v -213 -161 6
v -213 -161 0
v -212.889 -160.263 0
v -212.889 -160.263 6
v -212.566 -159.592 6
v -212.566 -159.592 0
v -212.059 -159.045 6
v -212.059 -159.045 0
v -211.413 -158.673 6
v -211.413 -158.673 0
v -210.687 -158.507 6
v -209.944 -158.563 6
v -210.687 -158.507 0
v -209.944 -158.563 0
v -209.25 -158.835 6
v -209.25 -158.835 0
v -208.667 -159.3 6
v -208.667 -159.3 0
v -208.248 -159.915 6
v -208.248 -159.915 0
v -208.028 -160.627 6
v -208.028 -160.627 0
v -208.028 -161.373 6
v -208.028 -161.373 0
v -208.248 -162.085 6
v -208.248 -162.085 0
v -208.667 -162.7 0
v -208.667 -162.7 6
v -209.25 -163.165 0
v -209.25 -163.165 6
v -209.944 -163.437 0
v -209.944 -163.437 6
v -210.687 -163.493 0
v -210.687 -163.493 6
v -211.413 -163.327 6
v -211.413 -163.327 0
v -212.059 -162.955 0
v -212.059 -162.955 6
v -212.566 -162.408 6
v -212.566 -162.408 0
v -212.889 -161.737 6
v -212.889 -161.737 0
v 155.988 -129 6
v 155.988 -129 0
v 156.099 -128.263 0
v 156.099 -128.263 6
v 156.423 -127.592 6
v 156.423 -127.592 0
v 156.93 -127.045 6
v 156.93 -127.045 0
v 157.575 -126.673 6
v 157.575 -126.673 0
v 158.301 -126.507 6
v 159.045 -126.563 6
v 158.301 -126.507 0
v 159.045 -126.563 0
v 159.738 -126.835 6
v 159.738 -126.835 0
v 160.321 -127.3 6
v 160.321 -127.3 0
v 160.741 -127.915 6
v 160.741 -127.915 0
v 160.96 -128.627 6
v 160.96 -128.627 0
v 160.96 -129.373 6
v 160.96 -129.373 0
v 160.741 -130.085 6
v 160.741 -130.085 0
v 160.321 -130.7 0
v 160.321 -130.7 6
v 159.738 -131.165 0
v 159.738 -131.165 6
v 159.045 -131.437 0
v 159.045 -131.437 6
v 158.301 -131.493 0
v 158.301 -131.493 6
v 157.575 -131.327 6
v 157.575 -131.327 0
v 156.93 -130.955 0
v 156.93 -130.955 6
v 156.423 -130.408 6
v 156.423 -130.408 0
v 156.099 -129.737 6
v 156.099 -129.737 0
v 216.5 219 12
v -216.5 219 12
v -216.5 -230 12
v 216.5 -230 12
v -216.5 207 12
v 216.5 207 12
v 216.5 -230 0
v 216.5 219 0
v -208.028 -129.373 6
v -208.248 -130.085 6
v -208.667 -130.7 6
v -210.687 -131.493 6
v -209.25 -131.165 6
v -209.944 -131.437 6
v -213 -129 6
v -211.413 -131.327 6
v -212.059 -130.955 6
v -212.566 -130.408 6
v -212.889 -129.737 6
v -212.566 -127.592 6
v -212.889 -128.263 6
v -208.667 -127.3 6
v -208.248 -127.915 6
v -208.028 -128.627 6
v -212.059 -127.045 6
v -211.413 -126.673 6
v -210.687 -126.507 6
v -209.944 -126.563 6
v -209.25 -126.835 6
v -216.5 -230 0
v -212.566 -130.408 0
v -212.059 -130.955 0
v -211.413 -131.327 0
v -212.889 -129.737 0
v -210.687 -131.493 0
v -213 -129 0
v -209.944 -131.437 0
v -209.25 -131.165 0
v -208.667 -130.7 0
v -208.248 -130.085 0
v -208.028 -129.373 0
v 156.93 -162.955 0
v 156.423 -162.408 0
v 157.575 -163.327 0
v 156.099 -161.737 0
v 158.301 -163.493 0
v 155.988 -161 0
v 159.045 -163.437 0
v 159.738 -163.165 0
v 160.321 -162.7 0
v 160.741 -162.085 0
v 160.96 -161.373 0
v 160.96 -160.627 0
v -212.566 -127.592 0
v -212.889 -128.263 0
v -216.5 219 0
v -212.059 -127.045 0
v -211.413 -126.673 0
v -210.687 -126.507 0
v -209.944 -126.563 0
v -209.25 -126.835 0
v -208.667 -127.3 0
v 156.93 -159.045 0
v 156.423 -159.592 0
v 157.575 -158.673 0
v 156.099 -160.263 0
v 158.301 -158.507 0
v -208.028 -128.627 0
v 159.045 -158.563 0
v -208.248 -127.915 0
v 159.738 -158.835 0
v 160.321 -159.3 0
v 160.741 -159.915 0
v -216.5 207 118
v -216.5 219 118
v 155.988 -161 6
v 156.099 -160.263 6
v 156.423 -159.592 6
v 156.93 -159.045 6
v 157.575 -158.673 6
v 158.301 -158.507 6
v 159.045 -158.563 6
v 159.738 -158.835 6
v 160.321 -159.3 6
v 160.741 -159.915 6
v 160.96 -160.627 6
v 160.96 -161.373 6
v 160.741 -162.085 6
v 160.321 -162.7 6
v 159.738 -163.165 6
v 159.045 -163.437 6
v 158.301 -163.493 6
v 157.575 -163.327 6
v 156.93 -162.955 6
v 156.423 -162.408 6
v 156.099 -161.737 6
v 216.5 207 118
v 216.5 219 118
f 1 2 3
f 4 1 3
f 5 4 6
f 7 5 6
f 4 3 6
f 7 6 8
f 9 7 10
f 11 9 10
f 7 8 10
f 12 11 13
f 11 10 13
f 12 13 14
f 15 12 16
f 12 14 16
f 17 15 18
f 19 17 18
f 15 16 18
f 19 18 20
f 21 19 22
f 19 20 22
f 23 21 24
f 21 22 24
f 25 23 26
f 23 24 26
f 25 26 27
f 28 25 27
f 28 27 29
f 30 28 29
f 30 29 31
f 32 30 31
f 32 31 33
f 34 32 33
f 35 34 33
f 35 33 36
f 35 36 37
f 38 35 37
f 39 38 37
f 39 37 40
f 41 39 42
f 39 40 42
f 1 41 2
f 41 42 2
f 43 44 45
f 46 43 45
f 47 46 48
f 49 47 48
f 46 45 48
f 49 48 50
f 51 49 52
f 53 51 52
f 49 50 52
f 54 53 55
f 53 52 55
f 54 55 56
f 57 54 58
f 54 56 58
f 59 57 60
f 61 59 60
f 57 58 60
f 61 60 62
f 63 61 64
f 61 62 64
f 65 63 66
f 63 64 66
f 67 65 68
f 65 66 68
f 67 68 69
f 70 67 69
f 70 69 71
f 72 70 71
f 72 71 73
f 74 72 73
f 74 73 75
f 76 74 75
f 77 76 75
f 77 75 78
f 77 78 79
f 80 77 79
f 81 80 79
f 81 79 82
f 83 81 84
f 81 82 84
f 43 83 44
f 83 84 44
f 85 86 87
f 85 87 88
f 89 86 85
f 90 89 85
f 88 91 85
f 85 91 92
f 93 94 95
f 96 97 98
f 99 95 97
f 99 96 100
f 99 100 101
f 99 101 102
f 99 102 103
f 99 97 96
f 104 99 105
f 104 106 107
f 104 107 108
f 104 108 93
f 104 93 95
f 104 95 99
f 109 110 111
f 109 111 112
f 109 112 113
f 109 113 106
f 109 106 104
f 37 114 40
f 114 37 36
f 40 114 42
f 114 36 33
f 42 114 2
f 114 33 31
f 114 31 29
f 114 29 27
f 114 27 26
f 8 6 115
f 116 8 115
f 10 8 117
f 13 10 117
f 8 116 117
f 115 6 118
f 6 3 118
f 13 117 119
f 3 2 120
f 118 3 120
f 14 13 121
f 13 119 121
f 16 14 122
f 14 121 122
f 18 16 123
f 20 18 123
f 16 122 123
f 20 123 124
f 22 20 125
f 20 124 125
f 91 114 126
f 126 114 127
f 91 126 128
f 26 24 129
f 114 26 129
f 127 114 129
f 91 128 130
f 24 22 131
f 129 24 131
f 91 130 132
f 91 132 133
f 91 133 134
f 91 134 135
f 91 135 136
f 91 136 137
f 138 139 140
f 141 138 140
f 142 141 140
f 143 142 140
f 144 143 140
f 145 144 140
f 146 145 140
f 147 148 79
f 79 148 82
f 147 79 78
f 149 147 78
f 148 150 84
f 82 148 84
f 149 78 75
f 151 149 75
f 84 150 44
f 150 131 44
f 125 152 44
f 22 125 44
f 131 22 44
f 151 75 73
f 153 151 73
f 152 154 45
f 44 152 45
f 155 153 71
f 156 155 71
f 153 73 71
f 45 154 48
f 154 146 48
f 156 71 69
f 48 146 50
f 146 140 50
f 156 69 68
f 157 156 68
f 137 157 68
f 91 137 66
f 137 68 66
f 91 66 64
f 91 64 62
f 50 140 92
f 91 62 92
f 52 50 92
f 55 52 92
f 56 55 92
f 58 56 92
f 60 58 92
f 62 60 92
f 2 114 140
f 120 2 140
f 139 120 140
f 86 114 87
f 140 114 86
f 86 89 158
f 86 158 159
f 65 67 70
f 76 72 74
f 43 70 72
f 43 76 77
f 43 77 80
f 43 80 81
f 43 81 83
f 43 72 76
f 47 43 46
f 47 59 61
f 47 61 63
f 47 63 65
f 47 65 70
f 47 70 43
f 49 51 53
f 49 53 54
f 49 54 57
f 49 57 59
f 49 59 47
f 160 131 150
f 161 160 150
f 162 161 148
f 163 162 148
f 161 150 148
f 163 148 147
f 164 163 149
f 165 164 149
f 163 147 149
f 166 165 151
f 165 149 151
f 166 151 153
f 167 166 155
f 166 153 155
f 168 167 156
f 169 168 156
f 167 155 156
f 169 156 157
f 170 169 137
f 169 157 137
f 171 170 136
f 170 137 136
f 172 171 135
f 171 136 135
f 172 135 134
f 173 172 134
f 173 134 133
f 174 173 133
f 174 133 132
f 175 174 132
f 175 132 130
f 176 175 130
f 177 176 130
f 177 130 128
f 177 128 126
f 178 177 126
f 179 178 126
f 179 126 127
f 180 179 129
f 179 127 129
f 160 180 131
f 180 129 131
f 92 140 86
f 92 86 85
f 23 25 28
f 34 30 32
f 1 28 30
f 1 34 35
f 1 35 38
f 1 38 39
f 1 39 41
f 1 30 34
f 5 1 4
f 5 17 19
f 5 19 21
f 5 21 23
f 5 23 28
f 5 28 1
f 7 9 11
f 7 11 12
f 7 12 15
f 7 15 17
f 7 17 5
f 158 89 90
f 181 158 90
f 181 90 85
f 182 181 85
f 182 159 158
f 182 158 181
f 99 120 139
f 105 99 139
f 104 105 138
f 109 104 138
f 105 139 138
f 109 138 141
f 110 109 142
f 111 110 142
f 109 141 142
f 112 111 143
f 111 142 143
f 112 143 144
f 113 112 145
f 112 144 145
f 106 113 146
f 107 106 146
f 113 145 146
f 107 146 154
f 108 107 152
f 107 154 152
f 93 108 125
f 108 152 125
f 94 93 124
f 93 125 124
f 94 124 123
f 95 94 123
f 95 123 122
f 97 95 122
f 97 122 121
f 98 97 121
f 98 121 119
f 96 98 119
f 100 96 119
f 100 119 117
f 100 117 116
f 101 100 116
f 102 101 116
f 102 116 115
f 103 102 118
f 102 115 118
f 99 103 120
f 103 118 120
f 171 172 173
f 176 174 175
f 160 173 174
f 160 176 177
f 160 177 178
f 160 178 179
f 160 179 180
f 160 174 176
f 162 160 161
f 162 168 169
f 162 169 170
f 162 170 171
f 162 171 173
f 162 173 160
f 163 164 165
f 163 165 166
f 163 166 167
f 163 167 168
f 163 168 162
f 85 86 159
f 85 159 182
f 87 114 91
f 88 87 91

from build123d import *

# Parameters (mm, degrees)
SKETCH1_W           = 433
SKETCH1_H           = 449
BOSS_EXTRUDE1_DEPTH = 12
SKETCH2_W           = 433
SKETCH2_H           = 12
BOSS_EXTRUDE2_DEPTH = 106
SKETCH3_R           = 2.5
CUT_EXTRUDE1_DEPTH  = 6


with BuildPart() as part:
    # Sketch1 → Boss-Extrude1 (new body)
    with BuildSketch(Plane.XY):
        with Locations((0, -5.5)):
            Rectangle(SKETCH1_W, SKETCH1_H)
    extrude(amount=BOSS_EXTRUDE1_DEPTH)

    # Sketch3 → Cut-Extrude1 (cut)
    with BuildSketch(Plane(origin=(0, 0, 0), x_dir=(-1, 0, 0), z_dir=(0, 0, -1))):
        with Locations((210.5, -161)):
            Circle(SKETCH3_R)
        with Locations((210.5, -129)):
            Circle(SKETCH3_R)
        with Locations((-158.488226886, -129)):
            Circle(SKETCH3_R)
        with Locations((-158.488226886, -161)):
            Circle(SKETCH3_R)
    extrude(amount=-CUT_EXTRUDE1_DEPTH, mode=Mode.SUBTRACT)


with BuildPart() as body_2:
    # Sketch2 → Boss-Extrude2 (new body)
    with BuildSketch(Plane.XY.offset(12)):
        with Locations((0, 213)):
            Rectangle(SKETCH2_W, SKETCH2_H)
    extrude(amount=BOSS_EXTRUDE2_DEPTH)


solid = Compound([part.part, body_2.part])
